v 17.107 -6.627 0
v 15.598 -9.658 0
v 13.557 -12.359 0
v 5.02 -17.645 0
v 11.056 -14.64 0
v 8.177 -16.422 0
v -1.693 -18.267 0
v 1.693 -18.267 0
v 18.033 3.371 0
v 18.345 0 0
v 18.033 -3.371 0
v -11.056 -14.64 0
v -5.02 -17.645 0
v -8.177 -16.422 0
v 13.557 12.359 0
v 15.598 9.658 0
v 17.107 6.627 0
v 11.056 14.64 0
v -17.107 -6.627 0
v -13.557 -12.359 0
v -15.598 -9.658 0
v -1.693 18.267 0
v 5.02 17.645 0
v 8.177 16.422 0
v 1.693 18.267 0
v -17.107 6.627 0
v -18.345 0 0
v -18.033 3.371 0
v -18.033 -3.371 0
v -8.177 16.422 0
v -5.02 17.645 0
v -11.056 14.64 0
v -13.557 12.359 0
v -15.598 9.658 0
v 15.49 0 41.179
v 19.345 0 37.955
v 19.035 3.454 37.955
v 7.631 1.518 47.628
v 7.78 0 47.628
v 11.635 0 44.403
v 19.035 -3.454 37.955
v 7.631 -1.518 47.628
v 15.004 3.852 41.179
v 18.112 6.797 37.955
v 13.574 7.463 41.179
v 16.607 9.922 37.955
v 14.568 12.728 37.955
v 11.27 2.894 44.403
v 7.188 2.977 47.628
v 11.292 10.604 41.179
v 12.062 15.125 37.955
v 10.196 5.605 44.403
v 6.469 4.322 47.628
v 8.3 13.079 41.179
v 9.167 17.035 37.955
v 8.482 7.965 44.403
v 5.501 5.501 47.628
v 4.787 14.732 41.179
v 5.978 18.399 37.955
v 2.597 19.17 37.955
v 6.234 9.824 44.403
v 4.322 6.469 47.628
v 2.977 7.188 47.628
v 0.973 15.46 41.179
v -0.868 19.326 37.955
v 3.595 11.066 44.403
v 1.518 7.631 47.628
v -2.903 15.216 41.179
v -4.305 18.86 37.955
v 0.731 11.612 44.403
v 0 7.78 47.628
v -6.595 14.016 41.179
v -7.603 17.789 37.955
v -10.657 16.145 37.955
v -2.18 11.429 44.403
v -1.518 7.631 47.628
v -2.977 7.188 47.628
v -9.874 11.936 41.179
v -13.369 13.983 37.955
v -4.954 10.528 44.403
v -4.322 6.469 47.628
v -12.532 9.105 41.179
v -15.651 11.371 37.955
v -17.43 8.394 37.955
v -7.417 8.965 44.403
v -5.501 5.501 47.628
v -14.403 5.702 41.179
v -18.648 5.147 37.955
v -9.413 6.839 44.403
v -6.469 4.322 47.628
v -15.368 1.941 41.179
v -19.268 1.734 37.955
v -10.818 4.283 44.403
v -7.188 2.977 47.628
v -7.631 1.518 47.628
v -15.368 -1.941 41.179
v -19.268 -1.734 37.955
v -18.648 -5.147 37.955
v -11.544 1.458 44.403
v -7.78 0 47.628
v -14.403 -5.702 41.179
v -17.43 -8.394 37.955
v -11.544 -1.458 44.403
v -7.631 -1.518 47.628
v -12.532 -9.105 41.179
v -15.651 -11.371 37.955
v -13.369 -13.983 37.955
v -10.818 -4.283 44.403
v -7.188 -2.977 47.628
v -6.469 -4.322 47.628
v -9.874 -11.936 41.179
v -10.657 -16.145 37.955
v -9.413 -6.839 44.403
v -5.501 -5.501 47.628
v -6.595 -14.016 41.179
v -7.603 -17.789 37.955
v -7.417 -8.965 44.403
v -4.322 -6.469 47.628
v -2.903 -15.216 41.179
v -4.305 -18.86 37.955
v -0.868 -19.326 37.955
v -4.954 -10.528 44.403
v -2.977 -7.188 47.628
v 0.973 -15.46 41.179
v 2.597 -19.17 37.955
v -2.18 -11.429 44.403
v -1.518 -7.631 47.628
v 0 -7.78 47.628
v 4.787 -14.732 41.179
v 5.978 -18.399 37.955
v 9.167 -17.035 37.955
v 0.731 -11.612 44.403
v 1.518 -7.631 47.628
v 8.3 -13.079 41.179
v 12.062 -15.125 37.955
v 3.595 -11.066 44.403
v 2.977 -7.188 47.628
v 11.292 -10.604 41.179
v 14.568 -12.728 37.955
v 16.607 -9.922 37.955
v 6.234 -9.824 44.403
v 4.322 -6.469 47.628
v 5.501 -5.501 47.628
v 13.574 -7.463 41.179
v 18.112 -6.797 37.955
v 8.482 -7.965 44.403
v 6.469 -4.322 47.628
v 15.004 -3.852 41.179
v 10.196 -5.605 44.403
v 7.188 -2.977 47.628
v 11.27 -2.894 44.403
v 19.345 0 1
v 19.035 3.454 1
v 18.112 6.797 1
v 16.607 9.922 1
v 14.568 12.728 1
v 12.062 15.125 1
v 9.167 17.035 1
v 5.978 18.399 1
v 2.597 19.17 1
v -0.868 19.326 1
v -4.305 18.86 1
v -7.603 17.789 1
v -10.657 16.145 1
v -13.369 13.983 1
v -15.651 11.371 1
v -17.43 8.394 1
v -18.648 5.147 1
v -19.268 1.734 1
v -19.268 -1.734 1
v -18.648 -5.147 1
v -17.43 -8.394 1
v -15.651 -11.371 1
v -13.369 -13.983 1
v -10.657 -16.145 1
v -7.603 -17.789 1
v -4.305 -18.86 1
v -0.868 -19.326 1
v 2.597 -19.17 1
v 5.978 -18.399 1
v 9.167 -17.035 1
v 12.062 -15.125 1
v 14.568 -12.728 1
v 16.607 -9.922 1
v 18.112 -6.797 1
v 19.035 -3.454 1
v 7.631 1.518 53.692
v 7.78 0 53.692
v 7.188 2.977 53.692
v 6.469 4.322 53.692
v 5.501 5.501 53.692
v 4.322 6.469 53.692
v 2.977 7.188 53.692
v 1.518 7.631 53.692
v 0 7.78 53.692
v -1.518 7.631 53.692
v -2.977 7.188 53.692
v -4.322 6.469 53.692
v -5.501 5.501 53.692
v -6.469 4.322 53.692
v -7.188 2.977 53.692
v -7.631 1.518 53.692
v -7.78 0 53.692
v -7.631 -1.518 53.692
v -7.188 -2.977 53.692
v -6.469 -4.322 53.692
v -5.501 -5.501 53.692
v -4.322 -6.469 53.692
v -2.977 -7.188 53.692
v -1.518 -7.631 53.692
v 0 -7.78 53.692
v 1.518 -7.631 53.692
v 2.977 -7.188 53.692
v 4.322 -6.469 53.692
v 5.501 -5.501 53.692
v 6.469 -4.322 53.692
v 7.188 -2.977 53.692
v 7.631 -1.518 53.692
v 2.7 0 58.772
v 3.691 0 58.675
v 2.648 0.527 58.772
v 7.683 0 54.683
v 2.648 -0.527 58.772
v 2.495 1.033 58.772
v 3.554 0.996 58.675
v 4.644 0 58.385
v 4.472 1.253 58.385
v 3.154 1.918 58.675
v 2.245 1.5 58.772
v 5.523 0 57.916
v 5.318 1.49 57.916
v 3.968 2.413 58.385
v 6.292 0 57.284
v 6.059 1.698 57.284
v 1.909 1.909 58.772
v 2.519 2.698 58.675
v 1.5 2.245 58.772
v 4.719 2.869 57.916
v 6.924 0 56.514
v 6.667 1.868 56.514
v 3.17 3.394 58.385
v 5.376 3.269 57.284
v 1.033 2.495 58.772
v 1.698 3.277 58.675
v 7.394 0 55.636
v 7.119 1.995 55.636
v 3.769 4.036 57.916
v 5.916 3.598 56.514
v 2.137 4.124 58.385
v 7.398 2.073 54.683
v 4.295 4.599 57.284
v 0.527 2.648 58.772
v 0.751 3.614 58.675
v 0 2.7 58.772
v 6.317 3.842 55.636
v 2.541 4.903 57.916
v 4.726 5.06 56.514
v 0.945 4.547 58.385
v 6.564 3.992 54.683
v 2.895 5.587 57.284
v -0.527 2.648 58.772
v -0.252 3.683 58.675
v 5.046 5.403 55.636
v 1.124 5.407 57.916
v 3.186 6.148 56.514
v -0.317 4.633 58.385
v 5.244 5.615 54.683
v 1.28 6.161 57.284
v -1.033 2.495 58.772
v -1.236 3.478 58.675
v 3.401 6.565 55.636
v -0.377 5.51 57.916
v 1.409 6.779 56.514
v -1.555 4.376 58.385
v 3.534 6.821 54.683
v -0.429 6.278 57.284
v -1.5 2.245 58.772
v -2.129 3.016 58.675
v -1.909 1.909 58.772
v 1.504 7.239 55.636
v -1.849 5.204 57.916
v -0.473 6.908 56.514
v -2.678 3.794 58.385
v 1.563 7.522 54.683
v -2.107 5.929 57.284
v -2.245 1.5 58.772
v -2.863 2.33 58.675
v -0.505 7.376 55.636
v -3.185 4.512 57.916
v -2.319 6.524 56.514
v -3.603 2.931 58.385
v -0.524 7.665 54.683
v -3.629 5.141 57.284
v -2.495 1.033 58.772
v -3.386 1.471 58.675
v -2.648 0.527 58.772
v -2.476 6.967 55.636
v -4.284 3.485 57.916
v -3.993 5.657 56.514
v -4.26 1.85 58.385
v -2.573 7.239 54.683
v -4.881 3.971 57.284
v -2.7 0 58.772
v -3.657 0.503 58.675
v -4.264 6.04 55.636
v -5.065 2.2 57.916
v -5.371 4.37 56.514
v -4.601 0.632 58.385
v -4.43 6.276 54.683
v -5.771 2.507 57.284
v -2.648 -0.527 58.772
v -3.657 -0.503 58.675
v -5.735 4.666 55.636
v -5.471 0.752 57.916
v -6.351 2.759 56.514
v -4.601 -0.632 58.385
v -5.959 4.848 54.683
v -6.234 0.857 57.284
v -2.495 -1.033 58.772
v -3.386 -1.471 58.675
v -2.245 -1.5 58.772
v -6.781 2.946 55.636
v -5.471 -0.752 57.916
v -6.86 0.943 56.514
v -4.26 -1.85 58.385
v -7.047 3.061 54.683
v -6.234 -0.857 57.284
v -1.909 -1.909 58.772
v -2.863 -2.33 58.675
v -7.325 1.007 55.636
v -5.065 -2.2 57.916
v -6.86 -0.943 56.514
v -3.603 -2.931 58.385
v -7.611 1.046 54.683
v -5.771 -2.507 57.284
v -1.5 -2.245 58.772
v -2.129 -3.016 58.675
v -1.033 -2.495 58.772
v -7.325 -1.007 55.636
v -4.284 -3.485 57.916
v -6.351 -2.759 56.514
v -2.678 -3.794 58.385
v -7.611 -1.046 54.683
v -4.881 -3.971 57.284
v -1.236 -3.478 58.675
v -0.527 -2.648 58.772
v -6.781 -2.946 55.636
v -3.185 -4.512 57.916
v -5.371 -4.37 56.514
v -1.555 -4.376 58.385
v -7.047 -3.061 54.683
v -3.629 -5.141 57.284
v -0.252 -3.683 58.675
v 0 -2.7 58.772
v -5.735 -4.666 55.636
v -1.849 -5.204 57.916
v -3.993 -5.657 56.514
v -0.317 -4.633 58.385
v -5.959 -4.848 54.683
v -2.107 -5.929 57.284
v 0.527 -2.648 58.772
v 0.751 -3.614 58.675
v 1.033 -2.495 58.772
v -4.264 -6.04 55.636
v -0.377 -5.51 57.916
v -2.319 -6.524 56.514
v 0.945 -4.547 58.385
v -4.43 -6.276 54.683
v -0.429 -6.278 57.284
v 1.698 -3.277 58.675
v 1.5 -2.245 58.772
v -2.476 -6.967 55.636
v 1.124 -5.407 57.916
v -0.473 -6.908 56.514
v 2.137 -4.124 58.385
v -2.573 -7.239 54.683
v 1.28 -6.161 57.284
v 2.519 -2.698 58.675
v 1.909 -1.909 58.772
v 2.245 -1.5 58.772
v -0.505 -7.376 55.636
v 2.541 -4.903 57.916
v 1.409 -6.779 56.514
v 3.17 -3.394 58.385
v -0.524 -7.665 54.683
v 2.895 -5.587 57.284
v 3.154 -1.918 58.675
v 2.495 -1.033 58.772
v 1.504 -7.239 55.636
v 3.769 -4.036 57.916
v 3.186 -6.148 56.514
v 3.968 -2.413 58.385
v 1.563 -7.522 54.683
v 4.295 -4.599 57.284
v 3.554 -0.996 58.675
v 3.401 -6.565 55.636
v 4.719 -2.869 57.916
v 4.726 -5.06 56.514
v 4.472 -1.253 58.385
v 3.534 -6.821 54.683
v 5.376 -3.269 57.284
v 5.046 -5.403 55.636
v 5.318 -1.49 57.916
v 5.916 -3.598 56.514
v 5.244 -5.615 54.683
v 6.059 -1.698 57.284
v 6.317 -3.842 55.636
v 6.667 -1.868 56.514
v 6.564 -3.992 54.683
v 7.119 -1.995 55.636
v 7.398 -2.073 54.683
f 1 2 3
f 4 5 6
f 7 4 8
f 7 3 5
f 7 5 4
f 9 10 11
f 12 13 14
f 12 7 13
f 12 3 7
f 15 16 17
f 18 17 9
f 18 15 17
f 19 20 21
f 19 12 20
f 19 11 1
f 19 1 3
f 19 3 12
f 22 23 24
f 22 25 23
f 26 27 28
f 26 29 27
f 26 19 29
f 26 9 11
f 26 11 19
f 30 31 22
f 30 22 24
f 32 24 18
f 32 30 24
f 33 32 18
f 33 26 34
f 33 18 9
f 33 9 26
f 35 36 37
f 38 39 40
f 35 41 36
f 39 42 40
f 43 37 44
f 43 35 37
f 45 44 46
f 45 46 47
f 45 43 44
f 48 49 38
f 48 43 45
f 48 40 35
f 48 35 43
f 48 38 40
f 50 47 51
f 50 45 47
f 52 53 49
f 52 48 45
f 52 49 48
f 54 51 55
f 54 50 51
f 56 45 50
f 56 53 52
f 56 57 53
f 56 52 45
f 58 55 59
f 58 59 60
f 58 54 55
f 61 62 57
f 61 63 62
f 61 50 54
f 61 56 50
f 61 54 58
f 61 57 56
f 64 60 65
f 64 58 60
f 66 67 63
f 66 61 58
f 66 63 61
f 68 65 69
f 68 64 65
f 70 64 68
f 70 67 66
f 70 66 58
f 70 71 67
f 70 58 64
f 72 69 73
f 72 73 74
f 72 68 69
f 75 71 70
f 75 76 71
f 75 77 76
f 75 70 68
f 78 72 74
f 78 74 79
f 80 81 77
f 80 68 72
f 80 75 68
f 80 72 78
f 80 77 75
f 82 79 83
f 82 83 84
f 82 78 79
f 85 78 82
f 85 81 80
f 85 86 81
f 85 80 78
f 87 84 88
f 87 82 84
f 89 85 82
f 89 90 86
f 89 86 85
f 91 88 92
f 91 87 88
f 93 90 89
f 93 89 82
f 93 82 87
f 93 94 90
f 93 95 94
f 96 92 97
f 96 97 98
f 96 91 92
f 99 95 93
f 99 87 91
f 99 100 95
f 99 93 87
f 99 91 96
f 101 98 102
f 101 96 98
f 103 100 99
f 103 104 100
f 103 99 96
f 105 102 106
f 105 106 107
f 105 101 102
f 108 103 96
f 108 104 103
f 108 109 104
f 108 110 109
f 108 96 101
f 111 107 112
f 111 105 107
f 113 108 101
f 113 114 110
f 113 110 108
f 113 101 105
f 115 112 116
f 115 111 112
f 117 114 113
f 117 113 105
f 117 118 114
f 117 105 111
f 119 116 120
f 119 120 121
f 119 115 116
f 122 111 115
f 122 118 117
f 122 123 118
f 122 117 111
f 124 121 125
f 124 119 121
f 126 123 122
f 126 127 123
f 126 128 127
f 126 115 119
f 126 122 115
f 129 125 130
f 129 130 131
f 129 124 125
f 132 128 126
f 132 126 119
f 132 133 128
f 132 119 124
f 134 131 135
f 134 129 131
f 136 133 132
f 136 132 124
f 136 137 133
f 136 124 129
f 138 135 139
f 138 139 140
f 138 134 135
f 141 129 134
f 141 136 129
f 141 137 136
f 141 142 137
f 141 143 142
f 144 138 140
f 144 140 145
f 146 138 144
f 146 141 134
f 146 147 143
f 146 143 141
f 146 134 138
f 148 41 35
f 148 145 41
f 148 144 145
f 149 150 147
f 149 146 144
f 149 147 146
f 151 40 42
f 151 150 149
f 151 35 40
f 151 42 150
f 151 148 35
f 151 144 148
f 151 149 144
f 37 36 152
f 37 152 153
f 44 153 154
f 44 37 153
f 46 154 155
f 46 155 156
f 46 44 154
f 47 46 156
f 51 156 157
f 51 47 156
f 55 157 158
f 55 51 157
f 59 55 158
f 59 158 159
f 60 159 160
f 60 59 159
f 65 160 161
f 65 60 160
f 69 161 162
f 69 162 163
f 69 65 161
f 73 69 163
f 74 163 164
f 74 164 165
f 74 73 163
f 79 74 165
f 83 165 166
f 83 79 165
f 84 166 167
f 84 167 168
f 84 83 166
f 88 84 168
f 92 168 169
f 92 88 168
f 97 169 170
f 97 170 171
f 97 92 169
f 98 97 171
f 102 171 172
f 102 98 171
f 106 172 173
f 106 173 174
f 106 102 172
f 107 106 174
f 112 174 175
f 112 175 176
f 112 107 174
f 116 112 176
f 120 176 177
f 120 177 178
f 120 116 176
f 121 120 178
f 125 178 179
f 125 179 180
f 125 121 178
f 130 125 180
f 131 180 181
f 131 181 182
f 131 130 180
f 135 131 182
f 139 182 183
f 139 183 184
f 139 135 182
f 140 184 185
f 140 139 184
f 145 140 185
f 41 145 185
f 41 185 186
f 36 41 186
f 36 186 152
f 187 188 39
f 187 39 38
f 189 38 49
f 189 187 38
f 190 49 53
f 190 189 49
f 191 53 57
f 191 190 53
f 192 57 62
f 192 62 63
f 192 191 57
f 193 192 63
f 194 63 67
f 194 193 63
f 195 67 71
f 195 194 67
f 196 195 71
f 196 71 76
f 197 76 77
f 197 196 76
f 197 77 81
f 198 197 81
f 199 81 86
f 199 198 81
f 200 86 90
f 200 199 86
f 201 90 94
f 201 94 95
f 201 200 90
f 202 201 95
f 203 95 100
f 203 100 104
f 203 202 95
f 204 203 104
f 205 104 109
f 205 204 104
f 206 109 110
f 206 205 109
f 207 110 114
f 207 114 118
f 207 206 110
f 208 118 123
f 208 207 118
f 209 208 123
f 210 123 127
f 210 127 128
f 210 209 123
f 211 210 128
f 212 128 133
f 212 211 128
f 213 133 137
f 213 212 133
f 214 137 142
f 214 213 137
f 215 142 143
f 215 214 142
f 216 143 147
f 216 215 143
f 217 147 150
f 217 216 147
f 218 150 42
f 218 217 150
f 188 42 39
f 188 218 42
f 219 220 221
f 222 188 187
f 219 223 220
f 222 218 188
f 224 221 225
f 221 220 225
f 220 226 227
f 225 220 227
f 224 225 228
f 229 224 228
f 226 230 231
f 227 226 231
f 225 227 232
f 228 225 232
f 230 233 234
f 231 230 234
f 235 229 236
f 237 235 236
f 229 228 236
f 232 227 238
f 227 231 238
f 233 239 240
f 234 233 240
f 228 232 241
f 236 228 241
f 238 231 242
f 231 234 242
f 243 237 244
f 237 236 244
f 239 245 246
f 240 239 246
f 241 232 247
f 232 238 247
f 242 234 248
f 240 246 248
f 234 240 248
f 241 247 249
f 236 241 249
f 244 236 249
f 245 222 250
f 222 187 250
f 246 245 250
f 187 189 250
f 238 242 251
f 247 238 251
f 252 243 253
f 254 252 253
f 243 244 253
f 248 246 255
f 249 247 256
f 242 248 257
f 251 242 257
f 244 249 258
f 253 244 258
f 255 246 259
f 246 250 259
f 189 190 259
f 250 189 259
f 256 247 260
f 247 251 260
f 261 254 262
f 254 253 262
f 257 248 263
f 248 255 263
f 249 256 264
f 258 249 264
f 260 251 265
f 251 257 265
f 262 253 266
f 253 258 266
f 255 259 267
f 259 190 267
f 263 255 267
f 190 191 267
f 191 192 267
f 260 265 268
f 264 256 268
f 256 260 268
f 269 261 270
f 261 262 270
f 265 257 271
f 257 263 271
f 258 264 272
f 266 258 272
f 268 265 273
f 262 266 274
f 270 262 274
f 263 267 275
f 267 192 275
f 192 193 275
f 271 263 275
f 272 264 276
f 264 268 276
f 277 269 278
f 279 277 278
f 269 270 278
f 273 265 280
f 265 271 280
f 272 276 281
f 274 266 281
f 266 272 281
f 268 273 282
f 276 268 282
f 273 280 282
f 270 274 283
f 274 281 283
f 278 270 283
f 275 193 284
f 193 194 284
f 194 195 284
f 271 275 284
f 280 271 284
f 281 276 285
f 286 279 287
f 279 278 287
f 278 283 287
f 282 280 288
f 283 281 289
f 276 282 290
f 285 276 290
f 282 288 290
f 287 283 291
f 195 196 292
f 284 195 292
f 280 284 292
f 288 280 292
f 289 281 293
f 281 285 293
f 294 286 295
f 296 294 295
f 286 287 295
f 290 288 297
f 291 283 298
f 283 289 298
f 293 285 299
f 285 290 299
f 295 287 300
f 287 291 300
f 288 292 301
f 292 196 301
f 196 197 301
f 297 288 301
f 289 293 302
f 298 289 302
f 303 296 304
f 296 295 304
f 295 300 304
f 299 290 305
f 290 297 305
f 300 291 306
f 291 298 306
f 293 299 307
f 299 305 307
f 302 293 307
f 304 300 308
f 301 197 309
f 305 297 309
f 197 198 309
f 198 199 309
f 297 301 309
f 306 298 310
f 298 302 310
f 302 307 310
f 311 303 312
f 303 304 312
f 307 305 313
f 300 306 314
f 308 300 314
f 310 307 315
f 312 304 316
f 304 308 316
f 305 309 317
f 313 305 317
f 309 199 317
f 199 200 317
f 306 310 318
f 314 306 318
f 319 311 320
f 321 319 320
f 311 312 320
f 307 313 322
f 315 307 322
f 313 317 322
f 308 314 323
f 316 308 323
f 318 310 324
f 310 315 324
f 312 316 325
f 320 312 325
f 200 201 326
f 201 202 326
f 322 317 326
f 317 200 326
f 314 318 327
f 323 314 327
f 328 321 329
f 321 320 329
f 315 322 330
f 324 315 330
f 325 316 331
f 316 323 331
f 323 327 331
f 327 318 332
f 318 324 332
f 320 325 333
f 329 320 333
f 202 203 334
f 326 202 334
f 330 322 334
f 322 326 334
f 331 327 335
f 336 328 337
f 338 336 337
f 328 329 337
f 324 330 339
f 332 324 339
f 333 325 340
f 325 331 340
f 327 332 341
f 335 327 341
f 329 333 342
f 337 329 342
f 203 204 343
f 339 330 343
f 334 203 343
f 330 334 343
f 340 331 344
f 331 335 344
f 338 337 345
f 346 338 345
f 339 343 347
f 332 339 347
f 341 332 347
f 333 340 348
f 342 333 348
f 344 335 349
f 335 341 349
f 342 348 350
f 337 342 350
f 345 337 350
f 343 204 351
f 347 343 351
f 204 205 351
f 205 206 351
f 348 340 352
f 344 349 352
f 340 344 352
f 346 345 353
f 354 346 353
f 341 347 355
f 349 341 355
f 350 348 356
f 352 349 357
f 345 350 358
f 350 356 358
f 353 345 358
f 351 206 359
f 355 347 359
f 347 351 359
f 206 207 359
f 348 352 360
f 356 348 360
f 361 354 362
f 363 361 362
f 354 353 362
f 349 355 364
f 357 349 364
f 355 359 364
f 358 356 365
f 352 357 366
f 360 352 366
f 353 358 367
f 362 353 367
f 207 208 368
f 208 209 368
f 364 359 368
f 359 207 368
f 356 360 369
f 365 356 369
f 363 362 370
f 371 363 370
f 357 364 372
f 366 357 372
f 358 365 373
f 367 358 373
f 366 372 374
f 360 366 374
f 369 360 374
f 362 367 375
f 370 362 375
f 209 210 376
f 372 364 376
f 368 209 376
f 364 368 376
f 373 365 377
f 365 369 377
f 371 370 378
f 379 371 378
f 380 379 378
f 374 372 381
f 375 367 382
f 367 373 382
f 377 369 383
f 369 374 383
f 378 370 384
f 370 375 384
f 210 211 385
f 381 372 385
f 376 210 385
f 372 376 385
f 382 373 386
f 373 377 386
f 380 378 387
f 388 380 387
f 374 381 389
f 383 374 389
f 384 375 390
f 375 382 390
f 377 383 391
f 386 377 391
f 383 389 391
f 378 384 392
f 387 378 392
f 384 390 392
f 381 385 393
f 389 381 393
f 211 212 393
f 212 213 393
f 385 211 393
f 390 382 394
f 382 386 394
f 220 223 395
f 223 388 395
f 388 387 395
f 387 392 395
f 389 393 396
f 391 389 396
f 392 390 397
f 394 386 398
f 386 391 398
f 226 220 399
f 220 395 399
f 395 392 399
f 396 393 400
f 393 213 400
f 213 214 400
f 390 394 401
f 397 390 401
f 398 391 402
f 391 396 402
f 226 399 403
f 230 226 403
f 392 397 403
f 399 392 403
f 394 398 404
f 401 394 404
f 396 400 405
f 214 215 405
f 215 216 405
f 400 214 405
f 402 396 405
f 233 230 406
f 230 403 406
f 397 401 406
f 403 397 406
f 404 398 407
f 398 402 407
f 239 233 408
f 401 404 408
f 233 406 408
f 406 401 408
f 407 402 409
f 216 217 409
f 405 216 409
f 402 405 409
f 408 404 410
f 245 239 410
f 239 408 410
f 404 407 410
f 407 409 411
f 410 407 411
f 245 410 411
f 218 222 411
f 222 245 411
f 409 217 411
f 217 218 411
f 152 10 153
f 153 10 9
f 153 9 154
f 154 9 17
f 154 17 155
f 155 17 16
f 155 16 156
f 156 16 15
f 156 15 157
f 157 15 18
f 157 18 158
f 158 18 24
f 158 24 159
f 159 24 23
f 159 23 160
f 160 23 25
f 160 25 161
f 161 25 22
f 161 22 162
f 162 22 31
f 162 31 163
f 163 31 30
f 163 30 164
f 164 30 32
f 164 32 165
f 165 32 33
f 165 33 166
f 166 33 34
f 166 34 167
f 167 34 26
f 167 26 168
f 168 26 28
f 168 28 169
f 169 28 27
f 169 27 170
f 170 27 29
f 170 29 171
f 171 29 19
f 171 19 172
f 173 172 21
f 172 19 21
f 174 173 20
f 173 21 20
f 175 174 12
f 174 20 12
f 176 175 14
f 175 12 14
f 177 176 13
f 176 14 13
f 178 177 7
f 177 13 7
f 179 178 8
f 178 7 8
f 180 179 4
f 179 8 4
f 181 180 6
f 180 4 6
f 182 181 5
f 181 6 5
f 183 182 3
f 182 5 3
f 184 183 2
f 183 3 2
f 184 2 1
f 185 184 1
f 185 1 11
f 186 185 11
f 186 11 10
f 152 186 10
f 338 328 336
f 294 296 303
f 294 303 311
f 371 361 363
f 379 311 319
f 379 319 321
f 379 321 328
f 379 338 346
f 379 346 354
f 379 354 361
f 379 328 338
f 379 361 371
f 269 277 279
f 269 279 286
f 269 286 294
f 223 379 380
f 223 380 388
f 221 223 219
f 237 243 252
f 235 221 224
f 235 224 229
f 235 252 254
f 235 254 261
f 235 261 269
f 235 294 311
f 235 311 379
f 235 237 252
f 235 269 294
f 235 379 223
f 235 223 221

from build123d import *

# Parameters (mm, degrees)
F2_R    = 5.08
F3_SIZE = 1


with BuildPart() as f1:
    # F0 (on Front) → F1 (revolve)
    with BuildSketch(Plane.XZ):
        Polygon((7.780209, 58.772128), (0, 58.772128), (0, 0), (19.34539, 0), (19.34539, 37.954811), (7.780209, 47.627505), align=None)
    revolve(axis=Axis((0, 0, 29.386064), (0, 0, 1)))

    # F2
    f2_edges = [f1.edges().sort_by_distance(p)[0] for p in [
        (-7.780209, 0, 58.772128),
    ]]
    fillet(f2_edges, radius=F2_R)

    # F3
    f3_edges = [f1.edges().sort_by_distance(p)[0] for p in [
        (-19.34539, 0, 0),
    ]]
    chamfer(f3_edges, length=F3_SIZE)


solid = f1.part
